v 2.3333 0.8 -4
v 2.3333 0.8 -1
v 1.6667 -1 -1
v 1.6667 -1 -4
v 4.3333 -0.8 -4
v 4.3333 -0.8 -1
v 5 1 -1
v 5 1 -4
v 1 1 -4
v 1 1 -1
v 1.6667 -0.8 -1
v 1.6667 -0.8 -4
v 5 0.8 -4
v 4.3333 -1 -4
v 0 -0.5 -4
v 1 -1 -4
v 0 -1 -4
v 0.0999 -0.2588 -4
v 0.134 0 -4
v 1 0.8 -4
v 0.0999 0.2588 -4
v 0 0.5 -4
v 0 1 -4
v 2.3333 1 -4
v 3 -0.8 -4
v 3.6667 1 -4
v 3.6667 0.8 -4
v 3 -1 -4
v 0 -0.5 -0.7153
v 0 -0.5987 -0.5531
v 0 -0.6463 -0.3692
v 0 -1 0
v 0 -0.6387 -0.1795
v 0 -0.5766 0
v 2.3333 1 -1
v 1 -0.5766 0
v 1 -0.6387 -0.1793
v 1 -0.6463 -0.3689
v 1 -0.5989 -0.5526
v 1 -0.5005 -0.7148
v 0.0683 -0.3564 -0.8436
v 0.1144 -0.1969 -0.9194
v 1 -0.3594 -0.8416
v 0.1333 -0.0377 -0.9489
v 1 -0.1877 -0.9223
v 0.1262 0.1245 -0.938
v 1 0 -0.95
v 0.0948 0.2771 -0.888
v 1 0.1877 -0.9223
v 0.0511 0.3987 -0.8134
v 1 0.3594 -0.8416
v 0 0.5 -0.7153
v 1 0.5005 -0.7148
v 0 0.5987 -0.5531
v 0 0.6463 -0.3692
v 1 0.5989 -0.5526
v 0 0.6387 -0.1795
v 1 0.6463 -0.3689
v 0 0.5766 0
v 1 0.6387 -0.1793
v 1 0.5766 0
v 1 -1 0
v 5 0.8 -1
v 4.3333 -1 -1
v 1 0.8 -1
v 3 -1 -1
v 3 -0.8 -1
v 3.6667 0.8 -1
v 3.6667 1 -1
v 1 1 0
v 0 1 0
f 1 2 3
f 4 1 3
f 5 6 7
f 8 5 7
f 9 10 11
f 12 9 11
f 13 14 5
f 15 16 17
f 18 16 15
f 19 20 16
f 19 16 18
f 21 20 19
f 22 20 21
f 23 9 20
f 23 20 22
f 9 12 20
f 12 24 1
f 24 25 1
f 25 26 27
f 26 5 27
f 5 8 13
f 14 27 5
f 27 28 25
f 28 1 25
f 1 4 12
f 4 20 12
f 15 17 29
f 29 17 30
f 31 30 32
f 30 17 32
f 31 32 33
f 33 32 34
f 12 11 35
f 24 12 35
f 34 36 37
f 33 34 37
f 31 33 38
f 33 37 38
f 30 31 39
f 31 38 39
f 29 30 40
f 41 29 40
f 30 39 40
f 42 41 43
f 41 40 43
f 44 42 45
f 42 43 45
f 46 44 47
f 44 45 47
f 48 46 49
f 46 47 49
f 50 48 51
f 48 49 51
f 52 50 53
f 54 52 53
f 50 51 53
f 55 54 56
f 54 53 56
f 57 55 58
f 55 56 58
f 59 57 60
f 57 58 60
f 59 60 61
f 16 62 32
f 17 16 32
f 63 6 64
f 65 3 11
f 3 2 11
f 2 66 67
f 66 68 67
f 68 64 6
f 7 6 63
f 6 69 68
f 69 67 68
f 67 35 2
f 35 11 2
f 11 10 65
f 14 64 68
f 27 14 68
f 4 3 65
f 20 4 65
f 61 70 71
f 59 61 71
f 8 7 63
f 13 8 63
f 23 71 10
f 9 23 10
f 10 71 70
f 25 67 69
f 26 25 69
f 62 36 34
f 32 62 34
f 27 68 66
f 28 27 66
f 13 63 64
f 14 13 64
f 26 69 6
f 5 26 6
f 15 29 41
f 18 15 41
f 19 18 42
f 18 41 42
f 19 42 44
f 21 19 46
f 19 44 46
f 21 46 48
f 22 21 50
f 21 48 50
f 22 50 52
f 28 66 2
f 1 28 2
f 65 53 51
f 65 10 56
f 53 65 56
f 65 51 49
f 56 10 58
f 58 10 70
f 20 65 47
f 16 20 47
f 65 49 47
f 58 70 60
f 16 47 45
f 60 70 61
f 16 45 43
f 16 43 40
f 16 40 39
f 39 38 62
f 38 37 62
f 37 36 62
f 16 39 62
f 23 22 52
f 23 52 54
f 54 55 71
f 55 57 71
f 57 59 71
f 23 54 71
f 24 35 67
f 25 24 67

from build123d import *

# Parameters (mm, degrees)
PAD011_DEPTH    = 4
PAD012_DEPTH    = 4
POCKET006_DEPTH = 1
SKETCH020_R     = 0.65
POCKET007_DEPTH = 1.001


with BuildPart() as part:
    # Sketch013 → Pad011 (new body)
    with BuildSketch(Plane.XY):
        with BuildLine():
            ThreePointArc((0, -0.5), (0.133975, 0), (0, 0.5))
            Line((0, 0.5), (0, 1))
            Line((0, 1), (1, 1))
            Line((1, 1), (1, -1))
            Line((1, -1), (0, -1))
            Line((0, -1), (0, -0.5))
        make_face()
    extrude(amount=-PAD011_DEPTH)

    # Sketch014 → Pad012 (join)
    with BuildSketch(Plane.XY):
        Polygon((1, 1), (1.666667, -0.8), (2.333333, 1), (3, -0.8), (3.666667, 1), (4.333333, -0.8), (5, 1), (5, 0.8), (4.333333, -1), (3.666667, 0.8), (3, -1), (2.333333, 0.8), (1.666667, -1), (1, 0.8), align=None)
    extrude(amount=-PAD012_DEPTH)

    # Pad012 Face8 → Pocket006 (cut)
    with BuildSketch(Plane(origin=(3, 0, 0), x_dir=(0, 1, 0), z_dir=(0, 0, 1))):
        Polygon((1, 2), (0.8, 2), (-1, 1.333333), (0.8, 0.666667), (-1, 0), (0.8, -0.666667), (-1, -1.333333), (0.8, -2), (1, -2), (-0.8, -1.333333), (1, -0.666667), (-0.8, 0), (1, 0.666667), (-0.8, 1.333333), align=None)
    extrude(amount=-POCKET006_DEPTH, mode=Mode.SUBTRACT)

    # Sketch020 (on Face9 of Pocket006) → Pocket007 (cut, through all)
    with BuildSketch(Plane.YZ.offset(1)):
        with Locations((0, -0.3)):
            Circle(SKETCH020_R)
    extrude(amount=-POCKET007_DEPTH, mode=Mode.SUBTRACT)


solid = part.part
